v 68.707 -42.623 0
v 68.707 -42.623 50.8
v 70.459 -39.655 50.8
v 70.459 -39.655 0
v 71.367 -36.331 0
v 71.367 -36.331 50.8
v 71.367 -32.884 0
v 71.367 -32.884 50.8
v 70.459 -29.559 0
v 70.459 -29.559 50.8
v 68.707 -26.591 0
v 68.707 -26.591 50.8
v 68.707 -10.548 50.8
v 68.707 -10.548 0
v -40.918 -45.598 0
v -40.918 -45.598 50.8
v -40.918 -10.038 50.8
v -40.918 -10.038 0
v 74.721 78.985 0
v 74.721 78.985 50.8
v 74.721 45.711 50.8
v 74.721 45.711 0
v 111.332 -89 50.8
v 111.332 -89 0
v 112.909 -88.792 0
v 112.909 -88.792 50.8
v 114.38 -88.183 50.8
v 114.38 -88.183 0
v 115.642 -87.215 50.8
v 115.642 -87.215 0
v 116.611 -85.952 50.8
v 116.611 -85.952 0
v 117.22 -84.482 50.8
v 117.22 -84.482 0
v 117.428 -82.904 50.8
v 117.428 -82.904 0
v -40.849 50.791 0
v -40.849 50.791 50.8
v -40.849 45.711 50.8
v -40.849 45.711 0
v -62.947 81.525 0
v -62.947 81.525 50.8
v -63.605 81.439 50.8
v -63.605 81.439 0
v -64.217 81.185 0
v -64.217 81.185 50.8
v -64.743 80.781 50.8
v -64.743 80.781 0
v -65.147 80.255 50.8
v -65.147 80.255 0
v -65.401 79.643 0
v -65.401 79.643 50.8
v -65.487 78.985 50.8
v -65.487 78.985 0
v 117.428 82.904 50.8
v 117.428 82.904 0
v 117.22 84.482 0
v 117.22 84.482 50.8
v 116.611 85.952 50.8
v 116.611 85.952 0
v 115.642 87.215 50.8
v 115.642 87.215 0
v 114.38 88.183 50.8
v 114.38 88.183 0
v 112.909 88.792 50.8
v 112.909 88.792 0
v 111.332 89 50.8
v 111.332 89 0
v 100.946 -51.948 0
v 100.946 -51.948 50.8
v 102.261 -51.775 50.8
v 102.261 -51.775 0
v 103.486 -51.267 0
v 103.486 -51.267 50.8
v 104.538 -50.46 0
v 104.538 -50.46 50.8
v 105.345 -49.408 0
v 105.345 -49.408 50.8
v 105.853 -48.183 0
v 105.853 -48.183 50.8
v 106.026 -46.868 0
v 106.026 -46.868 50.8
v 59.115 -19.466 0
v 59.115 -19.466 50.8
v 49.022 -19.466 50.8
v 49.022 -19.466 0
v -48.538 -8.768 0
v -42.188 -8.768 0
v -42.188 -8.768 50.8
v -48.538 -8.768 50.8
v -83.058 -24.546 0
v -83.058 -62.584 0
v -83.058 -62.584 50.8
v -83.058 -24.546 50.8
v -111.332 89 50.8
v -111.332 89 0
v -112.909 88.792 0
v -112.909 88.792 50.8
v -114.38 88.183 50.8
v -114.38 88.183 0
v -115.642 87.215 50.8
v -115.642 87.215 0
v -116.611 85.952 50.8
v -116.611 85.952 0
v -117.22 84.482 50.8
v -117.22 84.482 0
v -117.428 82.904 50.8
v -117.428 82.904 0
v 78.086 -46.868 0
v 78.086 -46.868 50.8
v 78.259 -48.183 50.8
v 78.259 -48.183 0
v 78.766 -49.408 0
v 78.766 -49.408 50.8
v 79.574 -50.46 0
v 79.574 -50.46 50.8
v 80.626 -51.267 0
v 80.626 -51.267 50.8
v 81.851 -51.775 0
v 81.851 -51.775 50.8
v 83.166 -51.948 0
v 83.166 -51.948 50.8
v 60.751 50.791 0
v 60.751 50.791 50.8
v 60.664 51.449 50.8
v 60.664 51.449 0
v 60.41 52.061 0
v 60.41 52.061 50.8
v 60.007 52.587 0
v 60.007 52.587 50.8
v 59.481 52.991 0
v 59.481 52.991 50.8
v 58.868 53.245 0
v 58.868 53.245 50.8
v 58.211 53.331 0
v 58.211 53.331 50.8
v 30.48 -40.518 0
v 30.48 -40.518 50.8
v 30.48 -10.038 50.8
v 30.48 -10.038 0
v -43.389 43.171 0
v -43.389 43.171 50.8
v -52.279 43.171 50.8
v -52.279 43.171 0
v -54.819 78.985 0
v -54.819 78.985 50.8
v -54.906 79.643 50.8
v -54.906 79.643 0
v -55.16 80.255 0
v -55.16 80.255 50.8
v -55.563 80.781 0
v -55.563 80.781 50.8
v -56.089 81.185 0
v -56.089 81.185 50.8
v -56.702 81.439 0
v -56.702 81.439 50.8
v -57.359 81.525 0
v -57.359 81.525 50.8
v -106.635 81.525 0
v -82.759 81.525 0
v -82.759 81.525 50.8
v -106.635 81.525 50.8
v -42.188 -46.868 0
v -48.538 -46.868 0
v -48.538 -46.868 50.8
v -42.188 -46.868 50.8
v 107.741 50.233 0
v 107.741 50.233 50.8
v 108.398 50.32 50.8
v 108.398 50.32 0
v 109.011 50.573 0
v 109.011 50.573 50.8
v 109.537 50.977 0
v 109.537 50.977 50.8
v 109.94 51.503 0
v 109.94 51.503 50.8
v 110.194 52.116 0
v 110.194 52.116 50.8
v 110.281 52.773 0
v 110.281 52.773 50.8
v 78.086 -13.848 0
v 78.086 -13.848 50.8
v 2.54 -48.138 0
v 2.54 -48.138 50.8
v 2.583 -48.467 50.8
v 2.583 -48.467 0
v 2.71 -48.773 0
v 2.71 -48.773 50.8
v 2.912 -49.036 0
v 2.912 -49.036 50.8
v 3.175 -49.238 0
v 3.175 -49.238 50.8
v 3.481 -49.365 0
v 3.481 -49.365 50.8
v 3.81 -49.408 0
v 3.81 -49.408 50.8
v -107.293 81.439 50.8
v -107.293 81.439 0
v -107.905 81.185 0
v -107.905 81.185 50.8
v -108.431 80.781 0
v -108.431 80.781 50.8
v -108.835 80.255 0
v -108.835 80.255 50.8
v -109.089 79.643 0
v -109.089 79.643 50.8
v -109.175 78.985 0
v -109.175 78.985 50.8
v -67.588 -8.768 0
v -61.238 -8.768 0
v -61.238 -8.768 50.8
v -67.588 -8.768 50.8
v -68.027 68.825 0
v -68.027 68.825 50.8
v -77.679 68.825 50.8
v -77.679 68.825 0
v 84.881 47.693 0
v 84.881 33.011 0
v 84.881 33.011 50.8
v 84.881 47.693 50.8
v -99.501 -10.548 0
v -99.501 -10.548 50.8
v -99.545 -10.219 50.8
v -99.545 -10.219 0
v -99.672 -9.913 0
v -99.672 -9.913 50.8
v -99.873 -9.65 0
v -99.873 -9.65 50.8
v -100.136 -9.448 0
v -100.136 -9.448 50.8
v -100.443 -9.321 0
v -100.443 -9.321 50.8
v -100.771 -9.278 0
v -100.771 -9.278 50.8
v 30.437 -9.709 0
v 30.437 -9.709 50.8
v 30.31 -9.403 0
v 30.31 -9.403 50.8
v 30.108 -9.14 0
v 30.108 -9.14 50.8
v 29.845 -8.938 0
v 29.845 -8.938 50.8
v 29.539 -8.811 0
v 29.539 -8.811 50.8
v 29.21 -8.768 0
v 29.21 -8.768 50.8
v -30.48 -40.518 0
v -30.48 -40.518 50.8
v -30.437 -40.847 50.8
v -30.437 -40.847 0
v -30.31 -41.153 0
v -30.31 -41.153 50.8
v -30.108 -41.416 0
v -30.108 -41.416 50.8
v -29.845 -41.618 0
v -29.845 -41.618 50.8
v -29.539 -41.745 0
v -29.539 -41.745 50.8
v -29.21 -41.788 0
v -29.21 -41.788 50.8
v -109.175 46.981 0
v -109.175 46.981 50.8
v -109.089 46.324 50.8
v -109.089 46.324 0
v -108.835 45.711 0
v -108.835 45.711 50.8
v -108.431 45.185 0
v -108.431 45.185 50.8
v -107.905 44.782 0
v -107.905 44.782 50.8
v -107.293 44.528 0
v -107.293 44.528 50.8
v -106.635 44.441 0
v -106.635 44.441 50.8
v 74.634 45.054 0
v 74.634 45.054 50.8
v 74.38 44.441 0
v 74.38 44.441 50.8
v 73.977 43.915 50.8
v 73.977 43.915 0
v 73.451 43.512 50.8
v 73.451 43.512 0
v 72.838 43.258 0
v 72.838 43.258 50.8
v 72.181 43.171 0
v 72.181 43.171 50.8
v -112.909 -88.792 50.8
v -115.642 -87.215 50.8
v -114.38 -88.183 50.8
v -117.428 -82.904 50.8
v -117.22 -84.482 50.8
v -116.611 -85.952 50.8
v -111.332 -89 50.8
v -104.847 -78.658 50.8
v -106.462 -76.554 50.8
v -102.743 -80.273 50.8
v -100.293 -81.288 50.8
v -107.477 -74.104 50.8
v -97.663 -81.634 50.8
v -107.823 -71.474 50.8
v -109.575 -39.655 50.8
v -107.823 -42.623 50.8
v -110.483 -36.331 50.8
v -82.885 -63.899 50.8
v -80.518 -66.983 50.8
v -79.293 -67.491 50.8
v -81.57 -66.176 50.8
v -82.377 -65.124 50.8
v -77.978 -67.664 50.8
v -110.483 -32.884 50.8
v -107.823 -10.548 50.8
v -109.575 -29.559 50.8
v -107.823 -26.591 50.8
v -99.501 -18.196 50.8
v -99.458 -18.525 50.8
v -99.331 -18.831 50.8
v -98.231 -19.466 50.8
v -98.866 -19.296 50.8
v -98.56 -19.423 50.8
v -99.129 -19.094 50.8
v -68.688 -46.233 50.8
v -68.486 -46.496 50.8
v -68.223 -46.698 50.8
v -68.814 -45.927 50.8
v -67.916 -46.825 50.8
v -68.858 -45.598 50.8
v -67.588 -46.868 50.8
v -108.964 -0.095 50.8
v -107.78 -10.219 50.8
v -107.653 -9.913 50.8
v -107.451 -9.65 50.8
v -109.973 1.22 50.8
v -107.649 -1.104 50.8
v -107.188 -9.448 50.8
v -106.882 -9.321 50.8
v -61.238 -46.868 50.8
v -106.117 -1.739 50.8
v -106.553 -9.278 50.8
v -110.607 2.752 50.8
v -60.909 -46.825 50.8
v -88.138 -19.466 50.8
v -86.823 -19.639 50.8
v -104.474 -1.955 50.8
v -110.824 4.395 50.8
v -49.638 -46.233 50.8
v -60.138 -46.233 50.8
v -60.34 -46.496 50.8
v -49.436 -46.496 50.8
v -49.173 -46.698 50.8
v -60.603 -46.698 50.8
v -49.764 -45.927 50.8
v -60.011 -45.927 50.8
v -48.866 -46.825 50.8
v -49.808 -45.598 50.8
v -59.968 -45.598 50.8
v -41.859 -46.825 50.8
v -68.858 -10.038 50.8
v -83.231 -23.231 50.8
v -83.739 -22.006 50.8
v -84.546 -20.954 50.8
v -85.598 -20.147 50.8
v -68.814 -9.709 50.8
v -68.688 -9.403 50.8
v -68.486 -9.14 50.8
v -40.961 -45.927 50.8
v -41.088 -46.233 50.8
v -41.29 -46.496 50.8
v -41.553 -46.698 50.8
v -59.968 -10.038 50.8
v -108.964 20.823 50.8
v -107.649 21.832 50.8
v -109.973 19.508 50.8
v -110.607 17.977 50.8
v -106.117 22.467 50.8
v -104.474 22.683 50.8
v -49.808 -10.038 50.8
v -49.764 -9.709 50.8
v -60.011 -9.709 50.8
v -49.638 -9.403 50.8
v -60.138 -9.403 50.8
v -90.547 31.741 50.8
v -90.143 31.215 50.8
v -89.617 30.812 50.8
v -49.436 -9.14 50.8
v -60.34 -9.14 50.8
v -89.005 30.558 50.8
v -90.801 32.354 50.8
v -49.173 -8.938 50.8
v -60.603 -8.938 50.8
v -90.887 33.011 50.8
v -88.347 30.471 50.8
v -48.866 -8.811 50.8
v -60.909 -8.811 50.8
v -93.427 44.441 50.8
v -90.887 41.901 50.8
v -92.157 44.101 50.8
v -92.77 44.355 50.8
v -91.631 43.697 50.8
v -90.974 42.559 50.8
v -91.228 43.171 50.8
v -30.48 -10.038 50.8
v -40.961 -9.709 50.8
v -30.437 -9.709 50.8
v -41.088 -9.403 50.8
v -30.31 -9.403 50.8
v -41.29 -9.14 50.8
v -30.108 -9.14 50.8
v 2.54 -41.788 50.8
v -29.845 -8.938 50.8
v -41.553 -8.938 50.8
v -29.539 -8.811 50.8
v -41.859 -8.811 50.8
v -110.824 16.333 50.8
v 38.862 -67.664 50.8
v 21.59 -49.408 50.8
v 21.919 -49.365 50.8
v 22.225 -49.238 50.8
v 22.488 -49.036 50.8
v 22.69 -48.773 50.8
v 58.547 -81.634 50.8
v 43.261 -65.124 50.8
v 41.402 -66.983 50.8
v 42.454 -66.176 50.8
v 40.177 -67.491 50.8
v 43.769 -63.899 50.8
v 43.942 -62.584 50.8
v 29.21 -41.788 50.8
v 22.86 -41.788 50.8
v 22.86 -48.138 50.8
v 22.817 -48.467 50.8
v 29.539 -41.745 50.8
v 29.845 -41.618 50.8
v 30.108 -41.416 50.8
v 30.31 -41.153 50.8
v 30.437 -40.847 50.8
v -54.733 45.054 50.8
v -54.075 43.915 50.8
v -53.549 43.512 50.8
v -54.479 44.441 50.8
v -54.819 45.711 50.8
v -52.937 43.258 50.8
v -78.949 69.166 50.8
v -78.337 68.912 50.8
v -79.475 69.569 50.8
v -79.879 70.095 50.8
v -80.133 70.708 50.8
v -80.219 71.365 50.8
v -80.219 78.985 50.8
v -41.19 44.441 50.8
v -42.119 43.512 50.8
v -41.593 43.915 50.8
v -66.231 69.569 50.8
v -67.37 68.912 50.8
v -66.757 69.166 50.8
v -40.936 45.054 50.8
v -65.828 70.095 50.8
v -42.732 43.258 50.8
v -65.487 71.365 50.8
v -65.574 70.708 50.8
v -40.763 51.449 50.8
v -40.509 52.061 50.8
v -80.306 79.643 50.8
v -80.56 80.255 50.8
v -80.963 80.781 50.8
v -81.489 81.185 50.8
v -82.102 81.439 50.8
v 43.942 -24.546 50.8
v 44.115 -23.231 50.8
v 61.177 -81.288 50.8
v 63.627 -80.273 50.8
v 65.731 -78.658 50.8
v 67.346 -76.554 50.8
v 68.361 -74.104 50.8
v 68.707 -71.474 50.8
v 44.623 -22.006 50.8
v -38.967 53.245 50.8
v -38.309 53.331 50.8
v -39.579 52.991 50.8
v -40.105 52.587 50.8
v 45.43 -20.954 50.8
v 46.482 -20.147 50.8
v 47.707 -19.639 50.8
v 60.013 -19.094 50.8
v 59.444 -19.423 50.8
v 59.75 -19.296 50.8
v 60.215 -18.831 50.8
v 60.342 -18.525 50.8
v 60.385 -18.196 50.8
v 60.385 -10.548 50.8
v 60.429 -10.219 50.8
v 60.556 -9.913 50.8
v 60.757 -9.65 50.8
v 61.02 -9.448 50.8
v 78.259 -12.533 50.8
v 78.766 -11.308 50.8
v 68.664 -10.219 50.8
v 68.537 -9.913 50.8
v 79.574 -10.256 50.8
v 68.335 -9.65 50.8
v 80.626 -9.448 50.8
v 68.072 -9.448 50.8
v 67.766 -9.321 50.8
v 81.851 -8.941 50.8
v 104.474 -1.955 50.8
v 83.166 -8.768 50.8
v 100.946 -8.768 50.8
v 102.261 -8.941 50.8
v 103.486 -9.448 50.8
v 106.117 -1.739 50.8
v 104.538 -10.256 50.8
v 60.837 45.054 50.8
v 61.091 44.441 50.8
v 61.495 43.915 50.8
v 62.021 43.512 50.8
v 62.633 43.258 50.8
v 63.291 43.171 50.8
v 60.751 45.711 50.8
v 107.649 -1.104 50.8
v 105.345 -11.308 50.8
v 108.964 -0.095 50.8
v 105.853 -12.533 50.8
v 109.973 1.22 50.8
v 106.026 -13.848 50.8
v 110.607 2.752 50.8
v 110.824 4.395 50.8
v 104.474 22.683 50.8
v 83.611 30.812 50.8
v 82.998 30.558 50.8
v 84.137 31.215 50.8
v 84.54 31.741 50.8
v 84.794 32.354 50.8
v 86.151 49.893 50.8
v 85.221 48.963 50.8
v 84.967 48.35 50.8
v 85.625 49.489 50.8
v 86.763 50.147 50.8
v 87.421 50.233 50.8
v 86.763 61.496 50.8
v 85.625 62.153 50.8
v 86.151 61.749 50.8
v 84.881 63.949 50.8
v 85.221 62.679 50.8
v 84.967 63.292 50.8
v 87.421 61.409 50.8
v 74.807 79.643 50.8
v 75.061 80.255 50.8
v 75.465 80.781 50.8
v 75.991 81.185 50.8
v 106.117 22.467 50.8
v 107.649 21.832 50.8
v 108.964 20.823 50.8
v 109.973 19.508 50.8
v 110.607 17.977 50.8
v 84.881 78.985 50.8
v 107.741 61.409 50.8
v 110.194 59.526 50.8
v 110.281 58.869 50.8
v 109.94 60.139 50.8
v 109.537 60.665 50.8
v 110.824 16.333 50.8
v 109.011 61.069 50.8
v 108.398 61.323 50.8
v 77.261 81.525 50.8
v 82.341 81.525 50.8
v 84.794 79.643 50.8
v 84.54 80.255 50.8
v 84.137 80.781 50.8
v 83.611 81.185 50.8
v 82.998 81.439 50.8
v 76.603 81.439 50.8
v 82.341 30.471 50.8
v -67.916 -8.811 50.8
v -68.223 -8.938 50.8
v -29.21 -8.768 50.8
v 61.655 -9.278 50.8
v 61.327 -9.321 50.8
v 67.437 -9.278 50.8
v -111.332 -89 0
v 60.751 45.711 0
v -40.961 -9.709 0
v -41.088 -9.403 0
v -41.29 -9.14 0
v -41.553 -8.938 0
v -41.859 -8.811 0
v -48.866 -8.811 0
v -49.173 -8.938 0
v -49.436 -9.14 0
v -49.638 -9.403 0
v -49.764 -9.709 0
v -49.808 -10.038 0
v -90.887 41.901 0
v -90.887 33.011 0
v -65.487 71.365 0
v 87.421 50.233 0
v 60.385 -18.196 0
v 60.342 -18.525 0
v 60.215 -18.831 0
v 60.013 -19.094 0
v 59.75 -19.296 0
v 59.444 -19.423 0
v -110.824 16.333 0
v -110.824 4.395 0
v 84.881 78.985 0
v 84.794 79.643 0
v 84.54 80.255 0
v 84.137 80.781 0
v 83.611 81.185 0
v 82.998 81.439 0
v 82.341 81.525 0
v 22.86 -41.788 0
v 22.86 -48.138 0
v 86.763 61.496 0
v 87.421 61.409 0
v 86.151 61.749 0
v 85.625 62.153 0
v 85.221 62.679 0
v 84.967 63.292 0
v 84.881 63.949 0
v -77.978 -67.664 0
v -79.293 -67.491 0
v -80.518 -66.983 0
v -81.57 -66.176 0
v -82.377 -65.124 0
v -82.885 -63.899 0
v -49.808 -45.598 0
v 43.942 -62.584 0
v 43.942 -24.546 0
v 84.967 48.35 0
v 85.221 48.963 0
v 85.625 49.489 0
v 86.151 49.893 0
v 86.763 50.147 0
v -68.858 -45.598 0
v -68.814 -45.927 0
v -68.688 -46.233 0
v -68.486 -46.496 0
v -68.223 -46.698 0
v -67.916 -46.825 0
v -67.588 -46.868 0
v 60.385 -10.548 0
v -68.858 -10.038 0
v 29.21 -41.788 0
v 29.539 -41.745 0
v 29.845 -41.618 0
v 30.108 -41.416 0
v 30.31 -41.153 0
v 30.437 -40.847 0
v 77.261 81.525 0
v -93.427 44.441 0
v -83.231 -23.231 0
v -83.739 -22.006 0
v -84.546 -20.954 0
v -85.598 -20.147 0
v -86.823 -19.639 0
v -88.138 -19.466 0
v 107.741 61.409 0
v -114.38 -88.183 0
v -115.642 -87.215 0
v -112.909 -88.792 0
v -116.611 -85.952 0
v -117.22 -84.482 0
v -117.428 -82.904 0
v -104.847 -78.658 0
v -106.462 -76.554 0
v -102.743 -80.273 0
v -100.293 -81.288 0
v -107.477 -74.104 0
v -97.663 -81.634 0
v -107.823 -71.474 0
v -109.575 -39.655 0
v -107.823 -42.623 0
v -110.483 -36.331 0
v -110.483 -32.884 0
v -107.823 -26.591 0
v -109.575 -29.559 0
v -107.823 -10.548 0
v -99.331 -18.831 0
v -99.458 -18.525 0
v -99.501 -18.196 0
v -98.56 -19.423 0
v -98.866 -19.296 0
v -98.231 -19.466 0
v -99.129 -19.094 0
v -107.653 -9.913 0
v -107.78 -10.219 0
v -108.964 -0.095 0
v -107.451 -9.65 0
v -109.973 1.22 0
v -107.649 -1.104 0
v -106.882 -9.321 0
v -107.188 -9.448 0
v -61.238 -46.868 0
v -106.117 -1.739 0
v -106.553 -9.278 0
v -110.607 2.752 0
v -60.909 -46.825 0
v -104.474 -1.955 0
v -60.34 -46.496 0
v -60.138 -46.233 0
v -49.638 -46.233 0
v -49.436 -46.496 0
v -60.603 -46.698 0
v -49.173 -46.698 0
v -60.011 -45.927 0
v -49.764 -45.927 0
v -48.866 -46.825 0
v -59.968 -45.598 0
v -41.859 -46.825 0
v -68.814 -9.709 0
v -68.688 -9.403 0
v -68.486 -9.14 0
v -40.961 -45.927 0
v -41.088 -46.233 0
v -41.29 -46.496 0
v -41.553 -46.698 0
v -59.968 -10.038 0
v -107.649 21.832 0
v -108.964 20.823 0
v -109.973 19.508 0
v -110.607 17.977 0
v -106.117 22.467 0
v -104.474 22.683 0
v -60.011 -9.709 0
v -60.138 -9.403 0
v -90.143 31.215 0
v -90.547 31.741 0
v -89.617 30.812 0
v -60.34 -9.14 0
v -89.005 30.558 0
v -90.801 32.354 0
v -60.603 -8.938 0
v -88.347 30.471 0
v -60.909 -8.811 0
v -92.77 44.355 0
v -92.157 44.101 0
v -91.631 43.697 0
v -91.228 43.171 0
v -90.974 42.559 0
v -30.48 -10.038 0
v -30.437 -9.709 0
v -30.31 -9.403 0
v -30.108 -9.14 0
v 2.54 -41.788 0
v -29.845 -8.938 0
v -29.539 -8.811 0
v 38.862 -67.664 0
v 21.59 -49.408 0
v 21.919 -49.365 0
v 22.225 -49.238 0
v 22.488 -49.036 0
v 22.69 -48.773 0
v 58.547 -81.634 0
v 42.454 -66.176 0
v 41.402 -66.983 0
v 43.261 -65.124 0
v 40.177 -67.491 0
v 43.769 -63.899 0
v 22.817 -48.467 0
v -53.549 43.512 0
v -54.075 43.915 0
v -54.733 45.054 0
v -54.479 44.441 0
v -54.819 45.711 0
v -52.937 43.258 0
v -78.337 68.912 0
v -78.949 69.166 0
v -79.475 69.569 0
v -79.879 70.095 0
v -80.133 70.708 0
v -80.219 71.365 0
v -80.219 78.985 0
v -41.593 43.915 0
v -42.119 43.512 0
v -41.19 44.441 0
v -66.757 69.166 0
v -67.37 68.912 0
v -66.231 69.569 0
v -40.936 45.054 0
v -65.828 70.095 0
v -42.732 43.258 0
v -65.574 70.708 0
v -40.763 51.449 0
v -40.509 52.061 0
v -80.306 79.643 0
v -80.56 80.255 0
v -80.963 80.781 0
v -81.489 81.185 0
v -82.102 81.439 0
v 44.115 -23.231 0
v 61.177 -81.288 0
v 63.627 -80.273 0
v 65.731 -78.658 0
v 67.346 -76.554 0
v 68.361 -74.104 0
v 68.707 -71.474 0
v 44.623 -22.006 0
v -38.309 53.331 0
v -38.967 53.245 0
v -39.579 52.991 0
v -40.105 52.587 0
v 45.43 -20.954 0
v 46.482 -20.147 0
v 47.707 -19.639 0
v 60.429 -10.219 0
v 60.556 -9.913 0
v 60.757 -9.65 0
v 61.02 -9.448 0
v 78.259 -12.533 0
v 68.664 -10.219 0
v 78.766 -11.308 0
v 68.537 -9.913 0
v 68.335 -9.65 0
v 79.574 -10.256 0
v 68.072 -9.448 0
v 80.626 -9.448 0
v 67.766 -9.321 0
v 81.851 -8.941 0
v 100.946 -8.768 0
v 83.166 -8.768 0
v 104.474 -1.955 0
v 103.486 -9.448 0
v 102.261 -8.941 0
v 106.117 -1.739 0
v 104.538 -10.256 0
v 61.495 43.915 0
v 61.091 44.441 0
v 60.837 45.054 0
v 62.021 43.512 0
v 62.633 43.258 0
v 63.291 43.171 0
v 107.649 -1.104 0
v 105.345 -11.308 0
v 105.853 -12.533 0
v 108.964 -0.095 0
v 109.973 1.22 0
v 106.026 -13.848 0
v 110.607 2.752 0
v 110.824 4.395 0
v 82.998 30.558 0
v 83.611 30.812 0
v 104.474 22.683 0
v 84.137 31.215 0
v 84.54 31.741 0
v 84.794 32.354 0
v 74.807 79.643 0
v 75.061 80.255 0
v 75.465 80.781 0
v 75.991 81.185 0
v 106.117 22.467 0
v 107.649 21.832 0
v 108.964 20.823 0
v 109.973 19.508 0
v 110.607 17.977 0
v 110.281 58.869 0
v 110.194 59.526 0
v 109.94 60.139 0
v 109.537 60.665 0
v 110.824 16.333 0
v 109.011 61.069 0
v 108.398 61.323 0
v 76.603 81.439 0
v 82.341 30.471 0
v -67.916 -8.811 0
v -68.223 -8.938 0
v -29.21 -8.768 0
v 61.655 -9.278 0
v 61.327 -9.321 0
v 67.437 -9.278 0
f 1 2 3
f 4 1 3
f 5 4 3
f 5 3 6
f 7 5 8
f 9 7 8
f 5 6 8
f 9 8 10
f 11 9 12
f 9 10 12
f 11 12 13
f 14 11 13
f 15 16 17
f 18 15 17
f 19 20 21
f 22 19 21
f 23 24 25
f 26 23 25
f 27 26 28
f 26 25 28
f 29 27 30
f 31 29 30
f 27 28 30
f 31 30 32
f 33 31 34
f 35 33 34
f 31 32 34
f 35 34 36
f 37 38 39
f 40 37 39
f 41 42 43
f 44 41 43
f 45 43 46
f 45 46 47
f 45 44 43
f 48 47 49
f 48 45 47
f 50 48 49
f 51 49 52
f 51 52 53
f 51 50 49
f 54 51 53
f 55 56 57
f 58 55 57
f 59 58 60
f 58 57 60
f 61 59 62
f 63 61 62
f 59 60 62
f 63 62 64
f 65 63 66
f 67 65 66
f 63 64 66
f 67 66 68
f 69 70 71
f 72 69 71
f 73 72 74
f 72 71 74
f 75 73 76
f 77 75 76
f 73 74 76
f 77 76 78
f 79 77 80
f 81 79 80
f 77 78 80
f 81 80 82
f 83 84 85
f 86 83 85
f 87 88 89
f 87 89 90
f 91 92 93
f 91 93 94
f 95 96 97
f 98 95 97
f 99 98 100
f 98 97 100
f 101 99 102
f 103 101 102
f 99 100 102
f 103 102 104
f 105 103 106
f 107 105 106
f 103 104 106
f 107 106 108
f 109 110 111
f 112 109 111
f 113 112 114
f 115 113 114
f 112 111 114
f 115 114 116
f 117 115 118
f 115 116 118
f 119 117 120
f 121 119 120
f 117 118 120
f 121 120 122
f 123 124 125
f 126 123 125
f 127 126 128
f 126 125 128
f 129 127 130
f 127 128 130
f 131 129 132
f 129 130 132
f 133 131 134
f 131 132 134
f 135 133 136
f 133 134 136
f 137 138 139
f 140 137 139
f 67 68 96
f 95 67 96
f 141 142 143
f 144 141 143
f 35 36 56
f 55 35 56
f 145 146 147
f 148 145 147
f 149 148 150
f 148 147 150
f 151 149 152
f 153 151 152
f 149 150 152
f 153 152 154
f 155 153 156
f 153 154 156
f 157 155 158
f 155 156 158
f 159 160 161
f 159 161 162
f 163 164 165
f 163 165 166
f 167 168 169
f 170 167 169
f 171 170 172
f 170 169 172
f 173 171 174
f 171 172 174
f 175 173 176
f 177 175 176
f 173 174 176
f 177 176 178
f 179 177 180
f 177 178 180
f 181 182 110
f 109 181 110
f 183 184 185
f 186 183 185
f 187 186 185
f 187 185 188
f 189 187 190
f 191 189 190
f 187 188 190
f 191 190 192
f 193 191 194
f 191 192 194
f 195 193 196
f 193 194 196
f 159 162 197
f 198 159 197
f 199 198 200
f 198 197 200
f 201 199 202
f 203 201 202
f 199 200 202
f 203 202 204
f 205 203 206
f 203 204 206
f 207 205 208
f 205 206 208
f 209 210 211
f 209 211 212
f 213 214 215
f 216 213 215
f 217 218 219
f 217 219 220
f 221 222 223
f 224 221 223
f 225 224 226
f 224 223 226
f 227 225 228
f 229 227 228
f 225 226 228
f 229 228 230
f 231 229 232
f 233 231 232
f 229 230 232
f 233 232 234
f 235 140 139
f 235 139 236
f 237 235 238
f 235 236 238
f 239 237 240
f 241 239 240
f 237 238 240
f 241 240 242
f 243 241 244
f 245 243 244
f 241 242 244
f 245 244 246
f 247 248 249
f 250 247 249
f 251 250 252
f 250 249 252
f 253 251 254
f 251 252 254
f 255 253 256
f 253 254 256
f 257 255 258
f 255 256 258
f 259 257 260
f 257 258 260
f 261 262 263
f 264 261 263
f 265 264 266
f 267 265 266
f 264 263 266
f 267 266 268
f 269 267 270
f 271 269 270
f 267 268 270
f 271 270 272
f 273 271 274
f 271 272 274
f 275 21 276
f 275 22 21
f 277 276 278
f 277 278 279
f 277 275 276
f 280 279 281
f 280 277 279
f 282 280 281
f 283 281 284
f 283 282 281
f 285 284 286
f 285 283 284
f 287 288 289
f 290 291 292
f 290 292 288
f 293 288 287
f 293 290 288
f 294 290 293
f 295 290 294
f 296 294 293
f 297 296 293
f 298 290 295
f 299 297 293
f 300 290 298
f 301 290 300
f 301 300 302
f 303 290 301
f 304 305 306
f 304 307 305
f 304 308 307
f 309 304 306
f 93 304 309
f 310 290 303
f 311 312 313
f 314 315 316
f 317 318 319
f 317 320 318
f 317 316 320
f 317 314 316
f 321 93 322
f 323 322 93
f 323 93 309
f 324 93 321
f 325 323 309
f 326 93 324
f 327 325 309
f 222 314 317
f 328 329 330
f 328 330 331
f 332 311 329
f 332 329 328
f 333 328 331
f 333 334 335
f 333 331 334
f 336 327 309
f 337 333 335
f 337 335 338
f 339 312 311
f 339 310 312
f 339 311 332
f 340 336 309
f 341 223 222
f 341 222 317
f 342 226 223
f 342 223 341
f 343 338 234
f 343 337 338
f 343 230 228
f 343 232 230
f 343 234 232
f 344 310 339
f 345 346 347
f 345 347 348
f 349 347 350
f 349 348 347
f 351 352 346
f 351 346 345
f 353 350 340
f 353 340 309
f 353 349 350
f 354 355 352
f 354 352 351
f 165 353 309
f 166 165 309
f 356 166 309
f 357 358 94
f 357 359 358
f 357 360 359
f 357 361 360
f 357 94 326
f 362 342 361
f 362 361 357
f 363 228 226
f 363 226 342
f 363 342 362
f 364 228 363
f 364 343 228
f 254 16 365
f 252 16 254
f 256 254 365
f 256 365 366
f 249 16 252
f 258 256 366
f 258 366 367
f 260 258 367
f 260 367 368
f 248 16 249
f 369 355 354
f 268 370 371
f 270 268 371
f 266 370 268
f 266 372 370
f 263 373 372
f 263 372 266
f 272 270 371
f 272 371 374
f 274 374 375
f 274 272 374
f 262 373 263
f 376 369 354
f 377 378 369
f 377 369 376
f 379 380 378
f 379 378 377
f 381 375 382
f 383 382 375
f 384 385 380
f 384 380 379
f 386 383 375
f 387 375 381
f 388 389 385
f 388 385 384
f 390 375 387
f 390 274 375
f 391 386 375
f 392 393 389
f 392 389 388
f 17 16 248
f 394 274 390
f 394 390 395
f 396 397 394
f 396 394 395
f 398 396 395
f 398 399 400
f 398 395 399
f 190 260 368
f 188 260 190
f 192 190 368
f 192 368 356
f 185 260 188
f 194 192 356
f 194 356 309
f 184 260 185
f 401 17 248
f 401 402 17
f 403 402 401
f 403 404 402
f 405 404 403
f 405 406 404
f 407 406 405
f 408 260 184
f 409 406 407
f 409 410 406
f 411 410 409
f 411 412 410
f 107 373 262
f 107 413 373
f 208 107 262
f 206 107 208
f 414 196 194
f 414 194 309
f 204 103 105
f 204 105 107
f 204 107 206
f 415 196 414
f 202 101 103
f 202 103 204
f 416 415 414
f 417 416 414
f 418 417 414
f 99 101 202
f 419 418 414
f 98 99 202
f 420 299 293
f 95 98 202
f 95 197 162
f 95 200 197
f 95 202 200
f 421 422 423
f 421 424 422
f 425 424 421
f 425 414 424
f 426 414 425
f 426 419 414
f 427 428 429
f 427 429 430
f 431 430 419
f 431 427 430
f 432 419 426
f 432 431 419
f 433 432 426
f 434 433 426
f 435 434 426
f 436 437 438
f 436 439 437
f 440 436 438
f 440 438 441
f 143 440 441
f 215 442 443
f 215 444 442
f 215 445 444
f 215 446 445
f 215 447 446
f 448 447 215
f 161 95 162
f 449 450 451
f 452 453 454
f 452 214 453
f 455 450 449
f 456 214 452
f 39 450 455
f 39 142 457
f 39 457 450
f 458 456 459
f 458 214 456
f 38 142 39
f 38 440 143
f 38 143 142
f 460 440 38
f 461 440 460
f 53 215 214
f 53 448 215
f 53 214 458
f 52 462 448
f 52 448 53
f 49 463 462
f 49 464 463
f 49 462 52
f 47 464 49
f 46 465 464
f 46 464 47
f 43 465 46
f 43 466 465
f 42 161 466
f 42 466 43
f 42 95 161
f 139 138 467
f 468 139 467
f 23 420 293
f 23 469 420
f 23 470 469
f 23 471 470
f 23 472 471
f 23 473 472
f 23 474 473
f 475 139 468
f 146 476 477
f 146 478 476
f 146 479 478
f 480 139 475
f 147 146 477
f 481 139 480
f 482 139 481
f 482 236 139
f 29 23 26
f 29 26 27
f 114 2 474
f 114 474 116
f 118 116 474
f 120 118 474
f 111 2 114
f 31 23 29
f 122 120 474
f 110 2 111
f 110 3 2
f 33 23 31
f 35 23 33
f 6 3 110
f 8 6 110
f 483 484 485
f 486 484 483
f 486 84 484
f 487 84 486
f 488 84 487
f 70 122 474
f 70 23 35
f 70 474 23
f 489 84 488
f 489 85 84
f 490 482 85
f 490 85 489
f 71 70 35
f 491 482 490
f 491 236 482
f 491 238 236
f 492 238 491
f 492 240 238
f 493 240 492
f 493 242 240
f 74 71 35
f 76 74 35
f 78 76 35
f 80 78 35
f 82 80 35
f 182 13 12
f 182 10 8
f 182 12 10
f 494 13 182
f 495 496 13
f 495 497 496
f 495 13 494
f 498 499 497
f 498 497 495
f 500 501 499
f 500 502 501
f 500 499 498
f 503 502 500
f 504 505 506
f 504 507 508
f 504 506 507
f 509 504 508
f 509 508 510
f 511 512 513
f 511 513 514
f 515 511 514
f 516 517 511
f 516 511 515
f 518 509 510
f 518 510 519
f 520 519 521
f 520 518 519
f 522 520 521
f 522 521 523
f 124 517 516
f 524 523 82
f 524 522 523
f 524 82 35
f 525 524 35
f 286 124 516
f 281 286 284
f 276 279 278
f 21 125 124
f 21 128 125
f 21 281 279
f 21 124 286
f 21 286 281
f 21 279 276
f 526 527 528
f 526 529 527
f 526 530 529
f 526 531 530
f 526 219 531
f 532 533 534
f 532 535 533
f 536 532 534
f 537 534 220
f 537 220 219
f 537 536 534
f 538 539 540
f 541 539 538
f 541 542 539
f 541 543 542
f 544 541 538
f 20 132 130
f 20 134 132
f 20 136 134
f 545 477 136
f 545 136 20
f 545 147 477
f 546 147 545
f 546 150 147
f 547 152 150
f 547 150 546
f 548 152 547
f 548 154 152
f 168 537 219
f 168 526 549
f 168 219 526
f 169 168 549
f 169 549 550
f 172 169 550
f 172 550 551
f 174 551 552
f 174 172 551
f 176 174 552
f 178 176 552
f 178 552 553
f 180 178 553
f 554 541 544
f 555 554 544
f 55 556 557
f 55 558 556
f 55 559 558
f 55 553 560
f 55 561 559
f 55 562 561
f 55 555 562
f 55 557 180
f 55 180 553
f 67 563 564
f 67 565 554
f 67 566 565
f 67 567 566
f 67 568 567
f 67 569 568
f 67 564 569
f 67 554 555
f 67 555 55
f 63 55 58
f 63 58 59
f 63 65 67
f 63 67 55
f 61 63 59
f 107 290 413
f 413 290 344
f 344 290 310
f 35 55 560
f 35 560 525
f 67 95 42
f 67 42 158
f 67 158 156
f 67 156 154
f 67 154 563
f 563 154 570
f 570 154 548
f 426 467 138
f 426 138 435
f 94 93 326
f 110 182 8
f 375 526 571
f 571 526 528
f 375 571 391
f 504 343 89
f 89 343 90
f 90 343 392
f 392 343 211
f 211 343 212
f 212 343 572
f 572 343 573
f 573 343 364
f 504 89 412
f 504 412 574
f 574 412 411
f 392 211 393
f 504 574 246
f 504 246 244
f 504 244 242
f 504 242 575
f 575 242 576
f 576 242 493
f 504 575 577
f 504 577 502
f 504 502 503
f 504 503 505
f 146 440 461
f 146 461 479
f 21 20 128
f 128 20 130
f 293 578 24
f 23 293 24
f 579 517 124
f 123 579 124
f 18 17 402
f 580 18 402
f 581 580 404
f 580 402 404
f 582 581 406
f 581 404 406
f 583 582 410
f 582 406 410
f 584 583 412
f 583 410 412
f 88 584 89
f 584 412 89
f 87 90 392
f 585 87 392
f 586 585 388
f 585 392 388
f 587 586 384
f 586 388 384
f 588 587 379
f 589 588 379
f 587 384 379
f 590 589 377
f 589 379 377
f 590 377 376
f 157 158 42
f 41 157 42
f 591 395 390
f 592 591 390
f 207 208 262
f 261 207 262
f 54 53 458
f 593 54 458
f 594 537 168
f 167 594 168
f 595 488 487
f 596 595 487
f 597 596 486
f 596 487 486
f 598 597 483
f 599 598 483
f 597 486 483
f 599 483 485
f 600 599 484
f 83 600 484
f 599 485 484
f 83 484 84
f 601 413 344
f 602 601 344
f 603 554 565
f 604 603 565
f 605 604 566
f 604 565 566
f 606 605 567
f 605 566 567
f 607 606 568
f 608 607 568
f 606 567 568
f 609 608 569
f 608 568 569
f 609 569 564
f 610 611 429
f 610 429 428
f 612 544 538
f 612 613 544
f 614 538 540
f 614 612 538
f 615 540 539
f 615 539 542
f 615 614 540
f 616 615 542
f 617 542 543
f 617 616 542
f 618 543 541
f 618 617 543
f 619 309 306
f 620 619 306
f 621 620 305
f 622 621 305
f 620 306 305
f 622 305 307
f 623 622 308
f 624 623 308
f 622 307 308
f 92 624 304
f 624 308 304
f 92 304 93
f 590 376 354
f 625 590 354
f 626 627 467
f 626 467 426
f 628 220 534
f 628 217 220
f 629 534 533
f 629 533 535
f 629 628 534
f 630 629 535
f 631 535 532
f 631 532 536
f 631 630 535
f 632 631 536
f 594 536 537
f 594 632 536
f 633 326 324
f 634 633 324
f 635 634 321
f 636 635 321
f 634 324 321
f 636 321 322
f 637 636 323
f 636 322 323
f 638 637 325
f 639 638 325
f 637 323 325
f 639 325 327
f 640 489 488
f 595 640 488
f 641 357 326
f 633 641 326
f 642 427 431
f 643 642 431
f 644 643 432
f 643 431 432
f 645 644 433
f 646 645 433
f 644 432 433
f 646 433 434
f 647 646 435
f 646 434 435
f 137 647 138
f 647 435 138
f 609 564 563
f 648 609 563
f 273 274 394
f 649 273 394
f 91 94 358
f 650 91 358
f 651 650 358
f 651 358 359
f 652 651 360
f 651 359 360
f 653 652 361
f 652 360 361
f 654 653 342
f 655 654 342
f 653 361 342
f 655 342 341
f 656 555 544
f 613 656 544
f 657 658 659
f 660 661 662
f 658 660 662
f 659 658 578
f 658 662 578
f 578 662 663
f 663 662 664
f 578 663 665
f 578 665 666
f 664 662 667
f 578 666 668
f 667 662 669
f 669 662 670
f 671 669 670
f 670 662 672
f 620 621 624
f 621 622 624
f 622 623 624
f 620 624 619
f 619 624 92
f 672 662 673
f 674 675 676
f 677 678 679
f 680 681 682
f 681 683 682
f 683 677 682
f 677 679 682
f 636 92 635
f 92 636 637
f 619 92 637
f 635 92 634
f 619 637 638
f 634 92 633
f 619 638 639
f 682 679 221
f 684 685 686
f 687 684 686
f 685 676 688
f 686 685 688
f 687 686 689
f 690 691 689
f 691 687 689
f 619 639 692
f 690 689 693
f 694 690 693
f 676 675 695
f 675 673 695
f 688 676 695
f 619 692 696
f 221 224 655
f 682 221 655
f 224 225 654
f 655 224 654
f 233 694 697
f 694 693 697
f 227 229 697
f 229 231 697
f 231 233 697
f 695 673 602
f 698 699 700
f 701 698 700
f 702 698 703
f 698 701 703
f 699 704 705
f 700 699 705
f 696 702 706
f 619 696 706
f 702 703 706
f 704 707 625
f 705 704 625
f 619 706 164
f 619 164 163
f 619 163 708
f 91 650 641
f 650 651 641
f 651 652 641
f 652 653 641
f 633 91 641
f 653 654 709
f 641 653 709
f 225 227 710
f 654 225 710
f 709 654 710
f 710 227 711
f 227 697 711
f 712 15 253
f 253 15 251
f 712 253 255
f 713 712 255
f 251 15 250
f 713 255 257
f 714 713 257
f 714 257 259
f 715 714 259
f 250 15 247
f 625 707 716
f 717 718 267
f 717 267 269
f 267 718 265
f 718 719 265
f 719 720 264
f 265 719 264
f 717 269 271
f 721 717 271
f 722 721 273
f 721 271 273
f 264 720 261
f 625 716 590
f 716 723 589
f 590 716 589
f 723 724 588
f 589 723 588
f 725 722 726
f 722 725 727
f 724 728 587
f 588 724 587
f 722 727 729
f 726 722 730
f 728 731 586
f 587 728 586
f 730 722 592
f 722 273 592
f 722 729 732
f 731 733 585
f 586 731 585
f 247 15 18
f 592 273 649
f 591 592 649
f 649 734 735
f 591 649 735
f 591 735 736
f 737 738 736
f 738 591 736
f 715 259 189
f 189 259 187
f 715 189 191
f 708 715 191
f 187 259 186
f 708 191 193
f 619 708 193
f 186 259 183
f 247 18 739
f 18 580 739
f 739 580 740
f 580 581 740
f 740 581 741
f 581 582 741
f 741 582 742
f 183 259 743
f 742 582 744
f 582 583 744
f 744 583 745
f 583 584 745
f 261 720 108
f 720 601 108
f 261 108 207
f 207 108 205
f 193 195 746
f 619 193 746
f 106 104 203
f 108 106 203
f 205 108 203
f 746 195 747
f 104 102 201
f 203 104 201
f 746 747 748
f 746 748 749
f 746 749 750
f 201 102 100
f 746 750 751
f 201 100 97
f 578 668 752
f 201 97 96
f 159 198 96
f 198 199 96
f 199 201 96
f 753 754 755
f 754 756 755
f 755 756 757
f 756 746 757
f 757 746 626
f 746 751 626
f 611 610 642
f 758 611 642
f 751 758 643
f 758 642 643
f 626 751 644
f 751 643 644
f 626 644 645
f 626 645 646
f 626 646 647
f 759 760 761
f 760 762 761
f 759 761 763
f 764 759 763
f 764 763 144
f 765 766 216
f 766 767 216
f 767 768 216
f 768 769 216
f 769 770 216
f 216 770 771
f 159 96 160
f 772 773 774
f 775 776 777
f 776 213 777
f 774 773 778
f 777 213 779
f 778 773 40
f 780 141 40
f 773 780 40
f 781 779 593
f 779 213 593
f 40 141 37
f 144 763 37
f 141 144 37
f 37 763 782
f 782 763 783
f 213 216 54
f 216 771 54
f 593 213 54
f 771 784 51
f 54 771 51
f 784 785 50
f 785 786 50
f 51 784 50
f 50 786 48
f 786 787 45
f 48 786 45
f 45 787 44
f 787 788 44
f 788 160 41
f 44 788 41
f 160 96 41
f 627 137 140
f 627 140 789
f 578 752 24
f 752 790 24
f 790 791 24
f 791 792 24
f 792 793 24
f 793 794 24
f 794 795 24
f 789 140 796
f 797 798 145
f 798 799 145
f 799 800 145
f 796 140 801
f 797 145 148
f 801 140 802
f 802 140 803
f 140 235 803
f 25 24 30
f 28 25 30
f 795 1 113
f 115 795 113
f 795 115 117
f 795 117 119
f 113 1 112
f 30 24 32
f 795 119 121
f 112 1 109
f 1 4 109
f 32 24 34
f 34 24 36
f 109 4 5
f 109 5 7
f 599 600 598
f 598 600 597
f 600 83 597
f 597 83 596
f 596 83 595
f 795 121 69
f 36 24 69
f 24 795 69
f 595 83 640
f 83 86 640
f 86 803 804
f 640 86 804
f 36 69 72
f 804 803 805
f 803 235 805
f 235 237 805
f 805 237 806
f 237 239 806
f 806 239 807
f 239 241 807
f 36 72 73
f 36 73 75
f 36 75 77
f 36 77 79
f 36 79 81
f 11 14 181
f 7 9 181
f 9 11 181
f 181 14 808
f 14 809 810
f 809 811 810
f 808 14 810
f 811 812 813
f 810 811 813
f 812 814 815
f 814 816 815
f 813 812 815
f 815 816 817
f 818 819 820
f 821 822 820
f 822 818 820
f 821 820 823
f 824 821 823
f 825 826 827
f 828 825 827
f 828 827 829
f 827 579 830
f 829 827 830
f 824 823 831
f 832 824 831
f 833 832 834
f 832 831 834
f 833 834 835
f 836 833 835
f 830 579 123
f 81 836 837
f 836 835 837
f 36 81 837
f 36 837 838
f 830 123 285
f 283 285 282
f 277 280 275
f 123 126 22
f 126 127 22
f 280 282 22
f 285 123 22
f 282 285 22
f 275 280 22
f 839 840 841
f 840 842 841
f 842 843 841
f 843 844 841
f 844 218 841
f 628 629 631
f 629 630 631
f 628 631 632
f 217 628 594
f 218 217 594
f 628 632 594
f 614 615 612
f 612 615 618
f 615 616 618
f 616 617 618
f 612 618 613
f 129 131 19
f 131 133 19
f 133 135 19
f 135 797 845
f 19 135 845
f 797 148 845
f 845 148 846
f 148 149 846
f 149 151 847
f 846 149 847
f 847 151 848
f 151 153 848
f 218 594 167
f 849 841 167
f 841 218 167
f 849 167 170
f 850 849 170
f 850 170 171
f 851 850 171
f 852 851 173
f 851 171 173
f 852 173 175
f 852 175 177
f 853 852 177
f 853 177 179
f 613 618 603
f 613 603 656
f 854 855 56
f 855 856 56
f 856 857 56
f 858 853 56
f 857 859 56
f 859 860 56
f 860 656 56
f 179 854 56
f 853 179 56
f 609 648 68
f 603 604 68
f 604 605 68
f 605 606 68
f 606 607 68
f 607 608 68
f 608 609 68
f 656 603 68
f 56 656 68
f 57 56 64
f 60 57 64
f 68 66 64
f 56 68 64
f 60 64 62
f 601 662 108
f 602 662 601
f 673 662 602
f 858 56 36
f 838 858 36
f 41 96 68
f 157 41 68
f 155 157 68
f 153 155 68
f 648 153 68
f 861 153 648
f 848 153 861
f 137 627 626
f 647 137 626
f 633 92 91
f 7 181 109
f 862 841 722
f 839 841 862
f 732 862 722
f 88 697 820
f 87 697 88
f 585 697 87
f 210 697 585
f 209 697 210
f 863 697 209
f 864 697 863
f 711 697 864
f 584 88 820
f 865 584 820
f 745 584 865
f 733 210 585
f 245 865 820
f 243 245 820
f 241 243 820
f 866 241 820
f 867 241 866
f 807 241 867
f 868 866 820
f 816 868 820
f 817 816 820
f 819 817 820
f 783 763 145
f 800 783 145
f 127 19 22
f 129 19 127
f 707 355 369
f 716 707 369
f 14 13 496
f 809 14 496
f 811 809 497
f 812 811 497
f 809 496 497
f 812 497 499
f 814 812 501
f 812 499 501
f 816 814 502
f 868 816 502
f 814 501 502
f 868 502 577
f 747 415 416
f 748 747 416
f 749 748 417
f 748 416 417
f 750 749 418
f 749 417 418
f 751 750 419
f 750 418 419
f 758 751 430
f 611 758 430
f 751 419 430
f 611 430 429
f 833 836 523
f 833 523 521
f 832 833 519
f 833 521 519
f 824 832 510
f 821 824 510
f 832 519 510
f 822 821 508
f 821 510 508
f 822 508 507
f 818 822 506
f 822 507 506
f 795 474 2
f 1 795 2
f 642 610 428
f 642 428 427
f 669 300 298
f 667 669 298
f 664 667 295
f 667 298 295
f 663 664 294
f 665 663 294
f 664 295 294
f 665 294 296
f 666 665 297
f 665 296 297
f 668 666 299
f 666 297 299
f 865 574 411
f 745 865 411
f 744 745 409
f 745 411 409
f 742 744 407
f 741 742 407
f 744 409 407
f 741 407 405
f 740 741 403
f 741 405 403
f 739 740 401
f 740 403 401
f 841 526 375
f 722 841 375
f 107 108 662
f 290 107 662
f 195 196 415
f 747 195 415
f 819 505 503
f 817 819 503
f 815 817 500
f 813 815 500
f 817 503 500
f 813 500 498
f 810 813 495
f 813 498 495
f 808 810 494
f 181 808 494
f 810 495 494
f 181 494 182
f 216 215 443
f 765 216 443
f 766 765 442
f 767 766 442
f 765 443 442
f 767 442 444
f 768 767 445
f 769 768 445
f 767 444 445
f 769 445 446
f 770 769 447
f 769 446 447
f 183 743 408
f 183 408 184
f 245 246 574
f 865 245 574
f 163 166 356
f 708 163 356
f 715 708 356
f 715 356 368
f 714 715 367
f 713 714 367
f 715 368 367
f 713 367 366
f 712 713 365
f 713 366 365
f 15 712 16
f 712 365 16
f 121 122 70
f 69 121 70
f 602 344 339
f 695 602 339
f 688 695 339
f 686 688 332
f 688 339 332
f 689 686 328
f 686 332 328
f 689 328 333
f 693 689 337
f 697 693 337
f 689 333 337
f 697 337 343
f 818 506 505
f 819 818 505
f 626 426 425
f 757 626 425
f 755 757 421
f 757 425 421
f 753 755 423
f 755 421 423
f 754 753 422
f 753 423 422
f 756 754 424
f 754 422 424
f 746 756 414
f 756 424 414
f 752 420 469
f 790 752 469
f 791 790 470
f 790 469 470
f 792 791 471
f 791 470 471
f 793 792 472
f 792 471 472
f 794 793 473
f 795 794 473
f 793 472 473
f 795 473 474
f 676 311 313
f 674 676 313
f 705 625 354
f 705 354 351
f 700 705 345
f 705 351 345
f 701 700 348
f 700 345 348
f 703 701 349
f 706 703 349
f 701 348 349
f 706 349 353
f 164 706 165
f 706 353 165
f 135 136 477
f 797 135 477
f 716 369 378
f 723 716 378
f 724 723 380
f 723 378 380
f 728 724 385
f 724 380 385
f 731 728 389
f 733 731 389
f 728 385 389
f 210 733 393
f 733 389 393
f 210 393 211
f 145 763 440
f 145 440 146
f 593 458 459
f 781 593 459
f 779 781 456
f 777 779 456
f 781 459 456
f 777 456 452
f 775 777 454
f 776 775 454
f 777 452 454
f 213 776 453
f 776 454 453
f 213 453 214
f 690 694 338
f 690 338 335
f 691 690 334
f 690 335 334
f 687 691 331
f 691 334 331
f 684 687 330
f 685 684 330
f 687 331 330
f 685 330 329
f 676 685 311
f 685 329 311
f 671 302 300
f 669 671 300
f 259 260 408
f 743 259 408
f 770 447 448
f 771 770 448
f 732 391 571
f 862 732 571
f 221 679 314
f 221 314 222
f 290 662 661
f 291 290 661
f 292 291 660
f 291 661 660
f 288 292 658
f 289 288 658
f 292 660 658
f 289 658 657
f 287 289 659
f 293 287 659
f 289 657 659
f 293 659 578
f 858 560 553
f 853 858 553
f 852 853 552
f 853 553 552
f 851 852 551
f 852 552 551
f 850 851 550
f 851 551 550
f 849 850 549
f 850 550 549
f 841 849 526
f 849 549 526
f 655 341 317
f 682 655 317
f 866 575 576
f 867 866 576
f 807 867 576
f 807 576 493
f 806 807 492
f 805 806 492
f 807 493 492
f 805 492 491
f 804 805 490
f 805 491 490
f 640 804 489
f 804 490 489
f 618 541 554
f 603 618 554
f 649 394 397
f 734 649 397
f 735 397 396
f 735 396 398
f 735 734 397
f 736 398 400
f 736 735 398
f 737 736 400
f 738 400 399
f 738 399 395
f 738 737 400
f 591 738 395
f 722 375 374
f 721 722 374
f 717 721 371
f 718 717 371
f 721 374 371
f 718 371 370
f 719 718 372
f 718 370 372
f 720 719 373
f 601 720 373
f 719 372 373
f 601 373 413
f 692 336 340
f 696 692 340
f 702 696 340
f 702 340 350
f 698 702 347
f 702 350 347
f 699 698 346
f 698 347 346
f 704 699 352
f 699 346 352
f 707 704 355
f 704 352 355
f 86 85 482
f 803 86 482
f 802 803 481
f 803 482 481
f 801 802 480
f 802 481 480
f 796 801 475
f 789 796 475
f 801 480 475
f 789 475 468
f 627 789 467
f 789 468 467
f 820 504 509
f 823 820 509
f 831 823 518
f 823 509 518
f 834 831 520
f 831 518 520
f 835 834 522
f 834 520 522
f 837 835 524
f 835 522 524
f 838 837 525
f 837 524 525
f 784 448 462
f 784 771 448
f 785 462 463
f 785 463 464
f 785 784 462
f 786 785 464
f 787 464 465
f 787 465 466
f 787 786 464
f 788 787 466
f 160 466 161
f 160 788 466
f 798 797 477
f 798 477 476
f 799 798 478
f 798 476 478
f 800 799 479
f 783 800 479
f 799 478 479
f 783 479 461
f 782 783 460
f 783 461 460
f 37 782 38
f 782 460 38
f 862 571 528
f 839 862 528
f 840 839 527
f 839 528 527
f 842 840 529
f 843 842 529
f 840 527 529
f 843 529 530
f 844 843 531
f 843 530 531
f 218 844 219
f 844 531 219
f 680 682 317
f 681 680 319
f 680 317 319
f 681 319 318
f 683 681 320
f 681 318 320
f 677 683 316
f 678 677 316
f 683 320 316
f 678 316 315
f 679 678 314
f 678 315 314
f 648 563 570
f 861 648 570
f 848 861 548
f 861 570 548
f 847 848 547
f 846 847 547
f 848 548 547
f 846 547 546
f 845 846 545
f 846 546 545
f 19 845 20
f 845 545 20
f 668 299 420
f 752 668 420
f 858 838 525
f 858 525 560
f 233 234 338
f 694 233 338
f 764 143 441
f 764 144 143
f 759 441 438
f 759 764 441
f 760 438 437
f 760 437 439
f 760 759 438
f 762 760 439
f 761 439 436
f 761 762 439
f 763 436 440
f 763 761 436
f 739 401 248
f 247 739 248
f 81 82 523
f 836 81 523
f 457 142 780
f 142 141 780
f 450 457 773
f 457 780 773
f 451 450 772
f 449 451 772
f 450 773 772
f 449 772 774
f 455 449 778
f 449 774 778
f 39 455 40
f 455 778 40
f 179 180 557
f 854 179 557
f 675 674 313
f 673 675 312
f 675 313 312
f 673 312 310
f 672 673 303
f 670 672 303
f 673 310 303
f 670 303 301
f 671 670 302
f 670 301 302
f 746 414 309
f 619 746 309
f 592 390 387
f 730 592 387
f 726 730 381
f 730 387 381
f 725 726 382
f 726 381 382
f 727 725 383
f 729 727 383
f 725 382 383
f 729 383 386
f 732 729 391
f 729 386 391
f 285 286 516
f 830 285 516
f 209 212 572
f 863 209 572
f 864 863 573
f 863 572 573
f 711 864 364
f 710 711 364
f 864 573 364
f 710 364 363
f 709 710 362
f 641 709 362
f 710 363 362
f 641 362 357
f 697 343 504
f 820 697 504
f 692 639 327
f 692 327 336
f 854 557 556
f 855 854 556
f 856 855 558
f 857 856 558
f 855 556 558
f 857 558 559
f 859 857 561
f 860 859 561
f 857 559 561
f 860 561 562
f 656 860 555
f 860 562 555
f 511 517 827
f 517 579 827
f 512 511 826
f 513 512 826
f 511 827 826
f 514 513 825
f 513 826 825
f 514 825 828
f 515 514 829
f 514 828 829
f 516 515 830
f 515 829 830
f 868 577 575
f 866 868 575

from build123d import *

# Parameters (mm, degrees)
F1_DEPTH = 50.8
F3_DEPTH = 50.8
F4_R     = 2.54
F5_R     = 2.54
F6_R     = 2.54
F8_DEPTH = 50.8


with BuildPart() as f1:
    # F0 (on Top) → F1 (new body)
    with BuildSketch(Plane.XY):
        with BuildLine():
            ThreePointArc((-111.331622, 89), (-115.642145, 87.214523), (-117.427622, 82.904))
            Line((-117.427622, 82.904), (-117.427622, -82.904))
            ThreePointArc((-117.427622, -82.904), (-115.642145, -87.214523), (-111.331622, -89))
            Line((-111.331622, -89), (111.331622, -89))
            ThreePointArc((111.331622, -89), (115.642145, -87.214523), (117.427622, -82.904))
            Line((117.427622, -82.904), (117.427622, 82.904))
            ThreePointArc((117.427622, 82.904), (115.642145, 87.214523), (111.331622, 89))
            Line((111.331622, 89), (-111.331622, 89))
        make_face()
    extrude(amount=F1_DEPTH)

    # F2 (on face) → F3 (cut)
    with BuildSketch(Plane.XY.offset(50.8)):
        with BuildLine():
            Line((104.473619, 22.683125), (-104.473626, 22.683125))
            ThreePointArc((-104.473626, 22.683125), (-108.963754, 20.823253), (-110.823626, 16.333125))
            Line((-110.823626, 16.333125), (-110.823626, 4.395125))
            ThreePointArc((-110.823626, 4.395125), (-108.963754, -0.095003), (-104.473626, -1.954875))
            Line((-104.473626, -1.954875), (104.473619, -1.954875))
            ThreePointArc((104.473619, -1.954875), (108.963747, -0.095003), (110.823619, 4.395125))
            Line((110.823619, 4.395125), (110.823619, 16.333125))
            ThreePointArc((110.823619, 16.333125), (108.963747, 20.823253), (104.473619, 22.683125))
        make_face()
        with BuildLine():
            ThreePointArc((-30.480004, -40.517802), (-30.108029, -41.415828), (-29.210004, -41.787802))
            Line((-29.210004, -41.787802), (2.539996, -41.787802))
            Line((2.539996, -41.787802), (22.859996, -41.787802))
            Line((22.859996, -41.787802), (29.209996, -41.787802))
            ThreePointArc((29.209996, -41.787802), (30.108022, -41.415828), (30.479996, -40.517802))
            Line((30.479996, -40.517802), (30.479996, -10.037802))
            ThreePointArc((30.479996, -10.037802), (30.108022, -9.139777), (29.209996, -8.767802))
            Line((29.209996, -8.767802), (-29.210004, -8.767802))
            ThreePointArc((-29.210004, -8.767802), (-30.108029, -9.139777), (-30.480004, -10.037802))
            Line((-30.480004, -10.037802), (-30.480004, -40.517802))
        make_face()
        with BuildLine():
            Line((22.859996, -41.787802), (2.539996, -41.787802))
            Line((2.539996, -41.787802), (2.539996, -48.137802))
            ThreePointArc((2.539996, -48.137802), (2.911971, -49.035828), (3.809996, -49.407802))
            Line((3.809996, -49.407802), (21.589996, -49.407802))
            ThreePointArc((21.589996, -49.407802), (22.488022, -49.035828), (22.859996, -48.137802))
            Line((22.859996, -48.137802), (22.859996, -41.787802))
        make_face()
        with BuildLine():
            ThreePointArc((83.165908, -8.767802), (79.573806, -10.2557), (78.085908, -13.847802))
            Line((78.085908, -13.847802), (78.085908, -46.867802))
            ThreePointArc((78.085908, -46.867802), (79.573806, -50.459905), (83.165908, -51.947802))
            Line((83.165908, -51.947802), (100.945908, -51.947802))
            ThreePointArc((100.945908, -51.947802), (104.538011, -50.459905), (106.025908, -46.867802))
            Line((106.025908, -46.867802), (106.025908, -13.847802))
            ThreePointArc((106.025908, -13.847802), (104.538011, -10.2557), (100.945908, -8.767802))
            Line((100.945908, -8.767802), (83.165908, -8.767802))
        make_face()
        with BuildLine():
            Line((-40.917659, -45.597802), (-40.917659, -10.037802))
            ThreePointArc((-40.917659, -10.037802), (-41.289633, -9.139777), (-42.187659, -8.767802))
            Line((-42.187659, -8.767802), (-48.537659, -8.767802))
            ThreePointArc((-48.537659, -8.767802), (-49.435685, -9.139777), (-49.807659, -10.037802))
            Line((-49.807659, -10.037802), (-49.807659, -45.597802))
            ThreePointArc((-49.807659, -45.597802), (-49.435685, -46.495828), (-48.537659, -46.867802))
            Line((-48.537659, -46.867802), (-42.187659, -46.867802))
            ThreePointArc((-42.187659, -46.867802), (-41.289633, -46.495828), (-40.917659, -45.597802))
        make_face()
        with BuildLine():
            Line((-90.887246, 81.525263), (-106.635246, 81.525263))
            ThreePointArc((-106.635246, 81.525263), (-108.431297, 80.781314), (-109.175246, 78.985263))
            Line((-109.175246, 78.985263), (-109.175246, 46.981263))
            ThreePointArc((-109.175246, 46.981263), (-108.431297, 45.185212), (-106.635246, 44.441263))
            Line((-106.635246, 44.441263), (-90.887246, 44.441263))
            Line((-90.887246, 44.441263), (-90.887246, 81.525263))
        make_face()
        with BuildLine():
            Line((-80.219246, 81.525263), (-90.887246, 81.525263))
            Line((-90.887246, 81.525263), (-90.887246, 44.441263))
            Line((-90.887246, 44.441263), (-90.887246, 33.011263))
            ThreePointArc((-90.887246, 33.011263), (-90.143297, 31.215212), (-88.347246, 30.471263))
            Line((-88.347246, 30.471263), (-54.819246, 30.471263))
            Line((-54.819246, 30.471263), (-54.819246, 43.171263))
            Line((-54.819246, 43.171263), (-54.819246, 78.985263))
            ThreePointArc((-54.819246, 78.985263), (-55.563195, 80.781314), (-57.359246, 81.525263))
            Line((-57.359246, 81.525263), (-65.487246, 81.525263))
            Line((-65.487246, 81.525263), (-65.487246, 71.365263))
            ThreePointArc((-65.487246, 71.365263), (-66.231195, 69.569212), (-68.027246, 68.825263))
            Line((-68.027246, 68.825263), (-77.679246, 68.825263))
            ThreePointArc((-77.679246, 68.825263), (-79.475297, 69.569212), (-80.219246, 71.365263))
            Line((-80.219246, 71.365263), (-80.219246, 81.525263))
        make_face()
        Polygon((-54.819246, 43.171263), (-54.819246, 30.471263), (74.720754, 30.471263), (74.720754, 43.171263), (60.750754, 43.171263), (-40.849246, 43.171263), align=None)
        with BuildLine():
            Line((74.720754, 43.171263), (74.720754, 30.471263))
            Line((74.720754, 30.471263), (82.340754, 30.471263))
            ThreePointArc((82.340754, 30.471263), (84.136805, 31.215212), (84.880754, 33.011263))
            Line((84.880754, 33.011263), (84.880754, 50.233088))
            Line((84.880754, 50.233088), (84.880754, 55.998263))
            Line((84.880754, 55.998263), (84.880754, 61.409088))
            Line((84.880754, 61.409088), (84.880754, 78.985263))
            ThreePointArc((84.880754, 78.985263), (84.136805, 80.781314), (82.340754, 81.525263))
            Line((82.340754, 81.525263), (77.260754, 81.525263))
            ThreePointArc((77.260754, 81.525263), (75.464703, 80.781314), (74.720754, 78.985263))
            Line((74.720754, 78.985263), (74.720754, 43.171263))
        make_face()
        with BuildLine():
            Line((-40.849246, 50.791263), (-40.849246, 43.171263))
            Line((-40.849246, 43.171263), (60.750754, 43.171263))
            Line((60.750754, 43.171263), (60.750754, 50.791263))
            ThreePointArc((60.750754, 50.791263), (60.006805, 52.587314), (58.210754, 53.331263))
            Line((58.210754, 53.331263), (-38.309246, 53.331263))
            ThreePointArc((-38.309246, 53.331263), (-40.105297, 52.587314), (-40.849246, 50.791263))
        make_face()
        with BuildLine():
            Line((84.880754, 55.998263), (84.880754, 50.233088))
            Line((84.880754, 50.233088), (107.740754, 50.233088))
            ThreePointArc((107.740754, 50.233088), (109.536805, 50.977037), (110.280754, 52.773088))
            Line((110.280754, 52.773088), (110.280754, 55.998263))
            Line((110.280754, 55.998263), (84.880754, 55.998263))
        make_face()
        with BuildLine():
            Line((84.880754, 61.409088), (84.880754, 55.998263))
            Line((84.880754, 55.998263), (110.280754, 55.998263))
            Line((110.280754, 55.998263), (110.280754, 58.869088))
            ThreePointArc((110.280754, 58.869088), (109.536805, 60.665139), (107.740754, 61.409088))
            Line((107.740754, 61.409088), (84.880754, 61.409088))
        make_face()
        with BuildLine():
            ThreePointArc((-61.237659, -46.867802), (-60.339633, -46.495828), (-59.967659, -45.597802))
            Line((-59.967659, -45.597802), (-59.967659, -10.037802))
            ThreePointArc((-59.967659, -10.037802), (-60.339633, -9.139777), (-61.237659, -8.767802))
            Line((-61.237659, -8.767802), (-67.587659, -8.767802))
            ThreePointArc((-67.587659, -8.767802), (-68.485685, -9.139777), (-68.857659, -10.037802))
            Line((-68.857659, -10.037802), (-68.857659, -45.597802))
            ThreePointArc((-68.857659, -45.597802), (-68.485685, -46.495828), (-67.587659, -46.867802))
            Line((-67.587659, -46.867802), (-61.237659, -46.867802))
        make_face()
    extrude(amount=-F3_DEPTH, mode=Mode.SUBTRACT)

    # F4
    f4_edges = [f1.edges().sort_by_distance(p)[0] for p in [
        (-54.819246, 43.171263, 25.4),
        (74.720754, 43.171263, 25.4),
        (84.880754, 50.233088, 25.4),
        (84.880754, 61.409088, 25.4),
        (-90.887246, 44.441263, 25.4),
    ]]
    fillet(f4_edges, radius=F4_R)

    # F5
    f5_edges = [f1.edges().sort_by_distance(p)[0] for p in [
        (-40.849246, 43.171263, 25.4),
        (60.750754, 43.171263, 25.4),
    ]]
    fillet(f5_edges, radius=F5_R)

    # F6
    f6_edges = [f1.edges().sort_by_distance(p)[0] for p in [
        (-80.219246, 81.525263, 25.4),
        (-65.487246, 81.525263, 25.4),
    ]]
    fillet(f6_edges, radius=F6_R)

    # F7 (on face) → F8 (cut)
    with BuildSketch(Plane.XY.offset(50.8)):
        with BuildLine():
            Line((25.847686, -67.664004), (-19.557998, -67.664004))
            Line((-19.557998, -67.664004), (-64.963682, -67.664004))
            Line((-64.963682, -67.664004), (-77.977998, -67.664004))
            ThreePointArc((-77.977998, -67.664004), (-81.570101, -66.176106), (-83.057998, -62.584004))
            Line((-83.057998, -62.584004), (-83.057998, -42.264004))
            Line((-83.057998, -42.264004), (-83.057998, -24.546178))
            ThreePointArc((-83.057998, -24.546178), (-84.545896, -20.954076), (-88.137998, -19.466178))
            Line((-88.137998, -19.466178), (-91.947998, -19.466178))
            Line((-91.947998, -19.466178), (-98.231429, -19.466178))
            ThreePointArc((-98.231429, -19.466178), (-99.129455, -19.094204), (-99.501429, -18.196178))
            Line((-99.501429, -18.196178), (-99.501429, -10.547931))
            ThreePointArc((-99.501429, -10.547931), (-99.873404, -9.649905), (-100.771429, -9.277931))
            Line((-100.771429, -9.277931), (-103.377998, -9.277931))
            Line((-103.377998, -9.277931), (-106.552998, -9.277931))
            ThreePointArc((-106.552998, -9.277931), (-107.451024, -9.649905), (-107.822998, -10.547931))
            Line((-107.822998, -10.547931), (-107.822998, -26.591364))
            Line((-107.822998, -26.591364), (-107.822998, -42.623485))
            Line((-107.822998, -42.623485), (-107.822998, -71.474004))
            ThreePointArc((-107.822998, -71.474004), (-104.847203, -78.658208), (-97.662998, -81.634004))
            Line((-97.662998, -81.634004), (-19.557998, -81.634004))
            Line((-19.557998, -81.634004), (58.547002, -81.634004))
            ThreePointArc((58.547002, -81.634004), (65.731206, -78.658208), (68.707002, -71.474004))
            Line((68.707002, -71.474004), (68.707002, -42.623485))
            Line((68.707002, -42.623485), (68.707002, -26.591364))
            Line((68.707002, -26.591364), (68.707002, -10.547931))
            ThreePointArc((68.707002, -10.547931), (68.335027, -9.649905), (67.437002, -9.277931))
            Line((67.437002, -9.277931), (64.262002, -9.277931))
            Line((64.262002, -9.277931), (61.655433, -9.277931))
            ThreePointArc((61.655433, -9.277931), (60.757407, -9.649905), (60.385433, -10.547931))
            Line((60.385433, -10.547931), (60.385433, -18.196178))
            ThreePointArc((60.385433, -18.196178), (60.013458, -19.094204), (59.115433, -19.466178))
            Line((59.115433, -19.466178), (52.832002, -19.466178))
            Line((52.832002, -19.466178), (49.022002, -19.466178))
            ThreePointArc((49.022002, -19.466178), (45.429899, -20.954076), (43.942002, -24.546178))
            Line((43.942002, -24.546178), (43.942002, -42.264004))
            Line((43.942002, -42.264004), (43.942002, -62.584004))
            ThreePointArc((43.942002, -62.584004), (42.454104, -66.176106), (38.862002, -67.664004))
            Line((38.862002, -67.664004), (25.847686, -67.664004))
        make_face()
        with BuildLine():
            Line((-107.822998, -42.623485), (-107.822998, -26.591364))
            ThreePointArc((-107.822998, -26.591364), (-110.597907, -34.607425), (-107.822998, -42.623485))
        make_face()
        with BuildLine():
            ThreePointArc((68.707002, -42.623485), (71.48191, -34.607425), (68.707002, -26.591364))
            Line((68.707002, -26.591364), (68.707002, -42.623485))
        make_face()
    extrude(amount=-F8_DEPTH, mode=Mode.SUBTRACT)


solid = f1.part
